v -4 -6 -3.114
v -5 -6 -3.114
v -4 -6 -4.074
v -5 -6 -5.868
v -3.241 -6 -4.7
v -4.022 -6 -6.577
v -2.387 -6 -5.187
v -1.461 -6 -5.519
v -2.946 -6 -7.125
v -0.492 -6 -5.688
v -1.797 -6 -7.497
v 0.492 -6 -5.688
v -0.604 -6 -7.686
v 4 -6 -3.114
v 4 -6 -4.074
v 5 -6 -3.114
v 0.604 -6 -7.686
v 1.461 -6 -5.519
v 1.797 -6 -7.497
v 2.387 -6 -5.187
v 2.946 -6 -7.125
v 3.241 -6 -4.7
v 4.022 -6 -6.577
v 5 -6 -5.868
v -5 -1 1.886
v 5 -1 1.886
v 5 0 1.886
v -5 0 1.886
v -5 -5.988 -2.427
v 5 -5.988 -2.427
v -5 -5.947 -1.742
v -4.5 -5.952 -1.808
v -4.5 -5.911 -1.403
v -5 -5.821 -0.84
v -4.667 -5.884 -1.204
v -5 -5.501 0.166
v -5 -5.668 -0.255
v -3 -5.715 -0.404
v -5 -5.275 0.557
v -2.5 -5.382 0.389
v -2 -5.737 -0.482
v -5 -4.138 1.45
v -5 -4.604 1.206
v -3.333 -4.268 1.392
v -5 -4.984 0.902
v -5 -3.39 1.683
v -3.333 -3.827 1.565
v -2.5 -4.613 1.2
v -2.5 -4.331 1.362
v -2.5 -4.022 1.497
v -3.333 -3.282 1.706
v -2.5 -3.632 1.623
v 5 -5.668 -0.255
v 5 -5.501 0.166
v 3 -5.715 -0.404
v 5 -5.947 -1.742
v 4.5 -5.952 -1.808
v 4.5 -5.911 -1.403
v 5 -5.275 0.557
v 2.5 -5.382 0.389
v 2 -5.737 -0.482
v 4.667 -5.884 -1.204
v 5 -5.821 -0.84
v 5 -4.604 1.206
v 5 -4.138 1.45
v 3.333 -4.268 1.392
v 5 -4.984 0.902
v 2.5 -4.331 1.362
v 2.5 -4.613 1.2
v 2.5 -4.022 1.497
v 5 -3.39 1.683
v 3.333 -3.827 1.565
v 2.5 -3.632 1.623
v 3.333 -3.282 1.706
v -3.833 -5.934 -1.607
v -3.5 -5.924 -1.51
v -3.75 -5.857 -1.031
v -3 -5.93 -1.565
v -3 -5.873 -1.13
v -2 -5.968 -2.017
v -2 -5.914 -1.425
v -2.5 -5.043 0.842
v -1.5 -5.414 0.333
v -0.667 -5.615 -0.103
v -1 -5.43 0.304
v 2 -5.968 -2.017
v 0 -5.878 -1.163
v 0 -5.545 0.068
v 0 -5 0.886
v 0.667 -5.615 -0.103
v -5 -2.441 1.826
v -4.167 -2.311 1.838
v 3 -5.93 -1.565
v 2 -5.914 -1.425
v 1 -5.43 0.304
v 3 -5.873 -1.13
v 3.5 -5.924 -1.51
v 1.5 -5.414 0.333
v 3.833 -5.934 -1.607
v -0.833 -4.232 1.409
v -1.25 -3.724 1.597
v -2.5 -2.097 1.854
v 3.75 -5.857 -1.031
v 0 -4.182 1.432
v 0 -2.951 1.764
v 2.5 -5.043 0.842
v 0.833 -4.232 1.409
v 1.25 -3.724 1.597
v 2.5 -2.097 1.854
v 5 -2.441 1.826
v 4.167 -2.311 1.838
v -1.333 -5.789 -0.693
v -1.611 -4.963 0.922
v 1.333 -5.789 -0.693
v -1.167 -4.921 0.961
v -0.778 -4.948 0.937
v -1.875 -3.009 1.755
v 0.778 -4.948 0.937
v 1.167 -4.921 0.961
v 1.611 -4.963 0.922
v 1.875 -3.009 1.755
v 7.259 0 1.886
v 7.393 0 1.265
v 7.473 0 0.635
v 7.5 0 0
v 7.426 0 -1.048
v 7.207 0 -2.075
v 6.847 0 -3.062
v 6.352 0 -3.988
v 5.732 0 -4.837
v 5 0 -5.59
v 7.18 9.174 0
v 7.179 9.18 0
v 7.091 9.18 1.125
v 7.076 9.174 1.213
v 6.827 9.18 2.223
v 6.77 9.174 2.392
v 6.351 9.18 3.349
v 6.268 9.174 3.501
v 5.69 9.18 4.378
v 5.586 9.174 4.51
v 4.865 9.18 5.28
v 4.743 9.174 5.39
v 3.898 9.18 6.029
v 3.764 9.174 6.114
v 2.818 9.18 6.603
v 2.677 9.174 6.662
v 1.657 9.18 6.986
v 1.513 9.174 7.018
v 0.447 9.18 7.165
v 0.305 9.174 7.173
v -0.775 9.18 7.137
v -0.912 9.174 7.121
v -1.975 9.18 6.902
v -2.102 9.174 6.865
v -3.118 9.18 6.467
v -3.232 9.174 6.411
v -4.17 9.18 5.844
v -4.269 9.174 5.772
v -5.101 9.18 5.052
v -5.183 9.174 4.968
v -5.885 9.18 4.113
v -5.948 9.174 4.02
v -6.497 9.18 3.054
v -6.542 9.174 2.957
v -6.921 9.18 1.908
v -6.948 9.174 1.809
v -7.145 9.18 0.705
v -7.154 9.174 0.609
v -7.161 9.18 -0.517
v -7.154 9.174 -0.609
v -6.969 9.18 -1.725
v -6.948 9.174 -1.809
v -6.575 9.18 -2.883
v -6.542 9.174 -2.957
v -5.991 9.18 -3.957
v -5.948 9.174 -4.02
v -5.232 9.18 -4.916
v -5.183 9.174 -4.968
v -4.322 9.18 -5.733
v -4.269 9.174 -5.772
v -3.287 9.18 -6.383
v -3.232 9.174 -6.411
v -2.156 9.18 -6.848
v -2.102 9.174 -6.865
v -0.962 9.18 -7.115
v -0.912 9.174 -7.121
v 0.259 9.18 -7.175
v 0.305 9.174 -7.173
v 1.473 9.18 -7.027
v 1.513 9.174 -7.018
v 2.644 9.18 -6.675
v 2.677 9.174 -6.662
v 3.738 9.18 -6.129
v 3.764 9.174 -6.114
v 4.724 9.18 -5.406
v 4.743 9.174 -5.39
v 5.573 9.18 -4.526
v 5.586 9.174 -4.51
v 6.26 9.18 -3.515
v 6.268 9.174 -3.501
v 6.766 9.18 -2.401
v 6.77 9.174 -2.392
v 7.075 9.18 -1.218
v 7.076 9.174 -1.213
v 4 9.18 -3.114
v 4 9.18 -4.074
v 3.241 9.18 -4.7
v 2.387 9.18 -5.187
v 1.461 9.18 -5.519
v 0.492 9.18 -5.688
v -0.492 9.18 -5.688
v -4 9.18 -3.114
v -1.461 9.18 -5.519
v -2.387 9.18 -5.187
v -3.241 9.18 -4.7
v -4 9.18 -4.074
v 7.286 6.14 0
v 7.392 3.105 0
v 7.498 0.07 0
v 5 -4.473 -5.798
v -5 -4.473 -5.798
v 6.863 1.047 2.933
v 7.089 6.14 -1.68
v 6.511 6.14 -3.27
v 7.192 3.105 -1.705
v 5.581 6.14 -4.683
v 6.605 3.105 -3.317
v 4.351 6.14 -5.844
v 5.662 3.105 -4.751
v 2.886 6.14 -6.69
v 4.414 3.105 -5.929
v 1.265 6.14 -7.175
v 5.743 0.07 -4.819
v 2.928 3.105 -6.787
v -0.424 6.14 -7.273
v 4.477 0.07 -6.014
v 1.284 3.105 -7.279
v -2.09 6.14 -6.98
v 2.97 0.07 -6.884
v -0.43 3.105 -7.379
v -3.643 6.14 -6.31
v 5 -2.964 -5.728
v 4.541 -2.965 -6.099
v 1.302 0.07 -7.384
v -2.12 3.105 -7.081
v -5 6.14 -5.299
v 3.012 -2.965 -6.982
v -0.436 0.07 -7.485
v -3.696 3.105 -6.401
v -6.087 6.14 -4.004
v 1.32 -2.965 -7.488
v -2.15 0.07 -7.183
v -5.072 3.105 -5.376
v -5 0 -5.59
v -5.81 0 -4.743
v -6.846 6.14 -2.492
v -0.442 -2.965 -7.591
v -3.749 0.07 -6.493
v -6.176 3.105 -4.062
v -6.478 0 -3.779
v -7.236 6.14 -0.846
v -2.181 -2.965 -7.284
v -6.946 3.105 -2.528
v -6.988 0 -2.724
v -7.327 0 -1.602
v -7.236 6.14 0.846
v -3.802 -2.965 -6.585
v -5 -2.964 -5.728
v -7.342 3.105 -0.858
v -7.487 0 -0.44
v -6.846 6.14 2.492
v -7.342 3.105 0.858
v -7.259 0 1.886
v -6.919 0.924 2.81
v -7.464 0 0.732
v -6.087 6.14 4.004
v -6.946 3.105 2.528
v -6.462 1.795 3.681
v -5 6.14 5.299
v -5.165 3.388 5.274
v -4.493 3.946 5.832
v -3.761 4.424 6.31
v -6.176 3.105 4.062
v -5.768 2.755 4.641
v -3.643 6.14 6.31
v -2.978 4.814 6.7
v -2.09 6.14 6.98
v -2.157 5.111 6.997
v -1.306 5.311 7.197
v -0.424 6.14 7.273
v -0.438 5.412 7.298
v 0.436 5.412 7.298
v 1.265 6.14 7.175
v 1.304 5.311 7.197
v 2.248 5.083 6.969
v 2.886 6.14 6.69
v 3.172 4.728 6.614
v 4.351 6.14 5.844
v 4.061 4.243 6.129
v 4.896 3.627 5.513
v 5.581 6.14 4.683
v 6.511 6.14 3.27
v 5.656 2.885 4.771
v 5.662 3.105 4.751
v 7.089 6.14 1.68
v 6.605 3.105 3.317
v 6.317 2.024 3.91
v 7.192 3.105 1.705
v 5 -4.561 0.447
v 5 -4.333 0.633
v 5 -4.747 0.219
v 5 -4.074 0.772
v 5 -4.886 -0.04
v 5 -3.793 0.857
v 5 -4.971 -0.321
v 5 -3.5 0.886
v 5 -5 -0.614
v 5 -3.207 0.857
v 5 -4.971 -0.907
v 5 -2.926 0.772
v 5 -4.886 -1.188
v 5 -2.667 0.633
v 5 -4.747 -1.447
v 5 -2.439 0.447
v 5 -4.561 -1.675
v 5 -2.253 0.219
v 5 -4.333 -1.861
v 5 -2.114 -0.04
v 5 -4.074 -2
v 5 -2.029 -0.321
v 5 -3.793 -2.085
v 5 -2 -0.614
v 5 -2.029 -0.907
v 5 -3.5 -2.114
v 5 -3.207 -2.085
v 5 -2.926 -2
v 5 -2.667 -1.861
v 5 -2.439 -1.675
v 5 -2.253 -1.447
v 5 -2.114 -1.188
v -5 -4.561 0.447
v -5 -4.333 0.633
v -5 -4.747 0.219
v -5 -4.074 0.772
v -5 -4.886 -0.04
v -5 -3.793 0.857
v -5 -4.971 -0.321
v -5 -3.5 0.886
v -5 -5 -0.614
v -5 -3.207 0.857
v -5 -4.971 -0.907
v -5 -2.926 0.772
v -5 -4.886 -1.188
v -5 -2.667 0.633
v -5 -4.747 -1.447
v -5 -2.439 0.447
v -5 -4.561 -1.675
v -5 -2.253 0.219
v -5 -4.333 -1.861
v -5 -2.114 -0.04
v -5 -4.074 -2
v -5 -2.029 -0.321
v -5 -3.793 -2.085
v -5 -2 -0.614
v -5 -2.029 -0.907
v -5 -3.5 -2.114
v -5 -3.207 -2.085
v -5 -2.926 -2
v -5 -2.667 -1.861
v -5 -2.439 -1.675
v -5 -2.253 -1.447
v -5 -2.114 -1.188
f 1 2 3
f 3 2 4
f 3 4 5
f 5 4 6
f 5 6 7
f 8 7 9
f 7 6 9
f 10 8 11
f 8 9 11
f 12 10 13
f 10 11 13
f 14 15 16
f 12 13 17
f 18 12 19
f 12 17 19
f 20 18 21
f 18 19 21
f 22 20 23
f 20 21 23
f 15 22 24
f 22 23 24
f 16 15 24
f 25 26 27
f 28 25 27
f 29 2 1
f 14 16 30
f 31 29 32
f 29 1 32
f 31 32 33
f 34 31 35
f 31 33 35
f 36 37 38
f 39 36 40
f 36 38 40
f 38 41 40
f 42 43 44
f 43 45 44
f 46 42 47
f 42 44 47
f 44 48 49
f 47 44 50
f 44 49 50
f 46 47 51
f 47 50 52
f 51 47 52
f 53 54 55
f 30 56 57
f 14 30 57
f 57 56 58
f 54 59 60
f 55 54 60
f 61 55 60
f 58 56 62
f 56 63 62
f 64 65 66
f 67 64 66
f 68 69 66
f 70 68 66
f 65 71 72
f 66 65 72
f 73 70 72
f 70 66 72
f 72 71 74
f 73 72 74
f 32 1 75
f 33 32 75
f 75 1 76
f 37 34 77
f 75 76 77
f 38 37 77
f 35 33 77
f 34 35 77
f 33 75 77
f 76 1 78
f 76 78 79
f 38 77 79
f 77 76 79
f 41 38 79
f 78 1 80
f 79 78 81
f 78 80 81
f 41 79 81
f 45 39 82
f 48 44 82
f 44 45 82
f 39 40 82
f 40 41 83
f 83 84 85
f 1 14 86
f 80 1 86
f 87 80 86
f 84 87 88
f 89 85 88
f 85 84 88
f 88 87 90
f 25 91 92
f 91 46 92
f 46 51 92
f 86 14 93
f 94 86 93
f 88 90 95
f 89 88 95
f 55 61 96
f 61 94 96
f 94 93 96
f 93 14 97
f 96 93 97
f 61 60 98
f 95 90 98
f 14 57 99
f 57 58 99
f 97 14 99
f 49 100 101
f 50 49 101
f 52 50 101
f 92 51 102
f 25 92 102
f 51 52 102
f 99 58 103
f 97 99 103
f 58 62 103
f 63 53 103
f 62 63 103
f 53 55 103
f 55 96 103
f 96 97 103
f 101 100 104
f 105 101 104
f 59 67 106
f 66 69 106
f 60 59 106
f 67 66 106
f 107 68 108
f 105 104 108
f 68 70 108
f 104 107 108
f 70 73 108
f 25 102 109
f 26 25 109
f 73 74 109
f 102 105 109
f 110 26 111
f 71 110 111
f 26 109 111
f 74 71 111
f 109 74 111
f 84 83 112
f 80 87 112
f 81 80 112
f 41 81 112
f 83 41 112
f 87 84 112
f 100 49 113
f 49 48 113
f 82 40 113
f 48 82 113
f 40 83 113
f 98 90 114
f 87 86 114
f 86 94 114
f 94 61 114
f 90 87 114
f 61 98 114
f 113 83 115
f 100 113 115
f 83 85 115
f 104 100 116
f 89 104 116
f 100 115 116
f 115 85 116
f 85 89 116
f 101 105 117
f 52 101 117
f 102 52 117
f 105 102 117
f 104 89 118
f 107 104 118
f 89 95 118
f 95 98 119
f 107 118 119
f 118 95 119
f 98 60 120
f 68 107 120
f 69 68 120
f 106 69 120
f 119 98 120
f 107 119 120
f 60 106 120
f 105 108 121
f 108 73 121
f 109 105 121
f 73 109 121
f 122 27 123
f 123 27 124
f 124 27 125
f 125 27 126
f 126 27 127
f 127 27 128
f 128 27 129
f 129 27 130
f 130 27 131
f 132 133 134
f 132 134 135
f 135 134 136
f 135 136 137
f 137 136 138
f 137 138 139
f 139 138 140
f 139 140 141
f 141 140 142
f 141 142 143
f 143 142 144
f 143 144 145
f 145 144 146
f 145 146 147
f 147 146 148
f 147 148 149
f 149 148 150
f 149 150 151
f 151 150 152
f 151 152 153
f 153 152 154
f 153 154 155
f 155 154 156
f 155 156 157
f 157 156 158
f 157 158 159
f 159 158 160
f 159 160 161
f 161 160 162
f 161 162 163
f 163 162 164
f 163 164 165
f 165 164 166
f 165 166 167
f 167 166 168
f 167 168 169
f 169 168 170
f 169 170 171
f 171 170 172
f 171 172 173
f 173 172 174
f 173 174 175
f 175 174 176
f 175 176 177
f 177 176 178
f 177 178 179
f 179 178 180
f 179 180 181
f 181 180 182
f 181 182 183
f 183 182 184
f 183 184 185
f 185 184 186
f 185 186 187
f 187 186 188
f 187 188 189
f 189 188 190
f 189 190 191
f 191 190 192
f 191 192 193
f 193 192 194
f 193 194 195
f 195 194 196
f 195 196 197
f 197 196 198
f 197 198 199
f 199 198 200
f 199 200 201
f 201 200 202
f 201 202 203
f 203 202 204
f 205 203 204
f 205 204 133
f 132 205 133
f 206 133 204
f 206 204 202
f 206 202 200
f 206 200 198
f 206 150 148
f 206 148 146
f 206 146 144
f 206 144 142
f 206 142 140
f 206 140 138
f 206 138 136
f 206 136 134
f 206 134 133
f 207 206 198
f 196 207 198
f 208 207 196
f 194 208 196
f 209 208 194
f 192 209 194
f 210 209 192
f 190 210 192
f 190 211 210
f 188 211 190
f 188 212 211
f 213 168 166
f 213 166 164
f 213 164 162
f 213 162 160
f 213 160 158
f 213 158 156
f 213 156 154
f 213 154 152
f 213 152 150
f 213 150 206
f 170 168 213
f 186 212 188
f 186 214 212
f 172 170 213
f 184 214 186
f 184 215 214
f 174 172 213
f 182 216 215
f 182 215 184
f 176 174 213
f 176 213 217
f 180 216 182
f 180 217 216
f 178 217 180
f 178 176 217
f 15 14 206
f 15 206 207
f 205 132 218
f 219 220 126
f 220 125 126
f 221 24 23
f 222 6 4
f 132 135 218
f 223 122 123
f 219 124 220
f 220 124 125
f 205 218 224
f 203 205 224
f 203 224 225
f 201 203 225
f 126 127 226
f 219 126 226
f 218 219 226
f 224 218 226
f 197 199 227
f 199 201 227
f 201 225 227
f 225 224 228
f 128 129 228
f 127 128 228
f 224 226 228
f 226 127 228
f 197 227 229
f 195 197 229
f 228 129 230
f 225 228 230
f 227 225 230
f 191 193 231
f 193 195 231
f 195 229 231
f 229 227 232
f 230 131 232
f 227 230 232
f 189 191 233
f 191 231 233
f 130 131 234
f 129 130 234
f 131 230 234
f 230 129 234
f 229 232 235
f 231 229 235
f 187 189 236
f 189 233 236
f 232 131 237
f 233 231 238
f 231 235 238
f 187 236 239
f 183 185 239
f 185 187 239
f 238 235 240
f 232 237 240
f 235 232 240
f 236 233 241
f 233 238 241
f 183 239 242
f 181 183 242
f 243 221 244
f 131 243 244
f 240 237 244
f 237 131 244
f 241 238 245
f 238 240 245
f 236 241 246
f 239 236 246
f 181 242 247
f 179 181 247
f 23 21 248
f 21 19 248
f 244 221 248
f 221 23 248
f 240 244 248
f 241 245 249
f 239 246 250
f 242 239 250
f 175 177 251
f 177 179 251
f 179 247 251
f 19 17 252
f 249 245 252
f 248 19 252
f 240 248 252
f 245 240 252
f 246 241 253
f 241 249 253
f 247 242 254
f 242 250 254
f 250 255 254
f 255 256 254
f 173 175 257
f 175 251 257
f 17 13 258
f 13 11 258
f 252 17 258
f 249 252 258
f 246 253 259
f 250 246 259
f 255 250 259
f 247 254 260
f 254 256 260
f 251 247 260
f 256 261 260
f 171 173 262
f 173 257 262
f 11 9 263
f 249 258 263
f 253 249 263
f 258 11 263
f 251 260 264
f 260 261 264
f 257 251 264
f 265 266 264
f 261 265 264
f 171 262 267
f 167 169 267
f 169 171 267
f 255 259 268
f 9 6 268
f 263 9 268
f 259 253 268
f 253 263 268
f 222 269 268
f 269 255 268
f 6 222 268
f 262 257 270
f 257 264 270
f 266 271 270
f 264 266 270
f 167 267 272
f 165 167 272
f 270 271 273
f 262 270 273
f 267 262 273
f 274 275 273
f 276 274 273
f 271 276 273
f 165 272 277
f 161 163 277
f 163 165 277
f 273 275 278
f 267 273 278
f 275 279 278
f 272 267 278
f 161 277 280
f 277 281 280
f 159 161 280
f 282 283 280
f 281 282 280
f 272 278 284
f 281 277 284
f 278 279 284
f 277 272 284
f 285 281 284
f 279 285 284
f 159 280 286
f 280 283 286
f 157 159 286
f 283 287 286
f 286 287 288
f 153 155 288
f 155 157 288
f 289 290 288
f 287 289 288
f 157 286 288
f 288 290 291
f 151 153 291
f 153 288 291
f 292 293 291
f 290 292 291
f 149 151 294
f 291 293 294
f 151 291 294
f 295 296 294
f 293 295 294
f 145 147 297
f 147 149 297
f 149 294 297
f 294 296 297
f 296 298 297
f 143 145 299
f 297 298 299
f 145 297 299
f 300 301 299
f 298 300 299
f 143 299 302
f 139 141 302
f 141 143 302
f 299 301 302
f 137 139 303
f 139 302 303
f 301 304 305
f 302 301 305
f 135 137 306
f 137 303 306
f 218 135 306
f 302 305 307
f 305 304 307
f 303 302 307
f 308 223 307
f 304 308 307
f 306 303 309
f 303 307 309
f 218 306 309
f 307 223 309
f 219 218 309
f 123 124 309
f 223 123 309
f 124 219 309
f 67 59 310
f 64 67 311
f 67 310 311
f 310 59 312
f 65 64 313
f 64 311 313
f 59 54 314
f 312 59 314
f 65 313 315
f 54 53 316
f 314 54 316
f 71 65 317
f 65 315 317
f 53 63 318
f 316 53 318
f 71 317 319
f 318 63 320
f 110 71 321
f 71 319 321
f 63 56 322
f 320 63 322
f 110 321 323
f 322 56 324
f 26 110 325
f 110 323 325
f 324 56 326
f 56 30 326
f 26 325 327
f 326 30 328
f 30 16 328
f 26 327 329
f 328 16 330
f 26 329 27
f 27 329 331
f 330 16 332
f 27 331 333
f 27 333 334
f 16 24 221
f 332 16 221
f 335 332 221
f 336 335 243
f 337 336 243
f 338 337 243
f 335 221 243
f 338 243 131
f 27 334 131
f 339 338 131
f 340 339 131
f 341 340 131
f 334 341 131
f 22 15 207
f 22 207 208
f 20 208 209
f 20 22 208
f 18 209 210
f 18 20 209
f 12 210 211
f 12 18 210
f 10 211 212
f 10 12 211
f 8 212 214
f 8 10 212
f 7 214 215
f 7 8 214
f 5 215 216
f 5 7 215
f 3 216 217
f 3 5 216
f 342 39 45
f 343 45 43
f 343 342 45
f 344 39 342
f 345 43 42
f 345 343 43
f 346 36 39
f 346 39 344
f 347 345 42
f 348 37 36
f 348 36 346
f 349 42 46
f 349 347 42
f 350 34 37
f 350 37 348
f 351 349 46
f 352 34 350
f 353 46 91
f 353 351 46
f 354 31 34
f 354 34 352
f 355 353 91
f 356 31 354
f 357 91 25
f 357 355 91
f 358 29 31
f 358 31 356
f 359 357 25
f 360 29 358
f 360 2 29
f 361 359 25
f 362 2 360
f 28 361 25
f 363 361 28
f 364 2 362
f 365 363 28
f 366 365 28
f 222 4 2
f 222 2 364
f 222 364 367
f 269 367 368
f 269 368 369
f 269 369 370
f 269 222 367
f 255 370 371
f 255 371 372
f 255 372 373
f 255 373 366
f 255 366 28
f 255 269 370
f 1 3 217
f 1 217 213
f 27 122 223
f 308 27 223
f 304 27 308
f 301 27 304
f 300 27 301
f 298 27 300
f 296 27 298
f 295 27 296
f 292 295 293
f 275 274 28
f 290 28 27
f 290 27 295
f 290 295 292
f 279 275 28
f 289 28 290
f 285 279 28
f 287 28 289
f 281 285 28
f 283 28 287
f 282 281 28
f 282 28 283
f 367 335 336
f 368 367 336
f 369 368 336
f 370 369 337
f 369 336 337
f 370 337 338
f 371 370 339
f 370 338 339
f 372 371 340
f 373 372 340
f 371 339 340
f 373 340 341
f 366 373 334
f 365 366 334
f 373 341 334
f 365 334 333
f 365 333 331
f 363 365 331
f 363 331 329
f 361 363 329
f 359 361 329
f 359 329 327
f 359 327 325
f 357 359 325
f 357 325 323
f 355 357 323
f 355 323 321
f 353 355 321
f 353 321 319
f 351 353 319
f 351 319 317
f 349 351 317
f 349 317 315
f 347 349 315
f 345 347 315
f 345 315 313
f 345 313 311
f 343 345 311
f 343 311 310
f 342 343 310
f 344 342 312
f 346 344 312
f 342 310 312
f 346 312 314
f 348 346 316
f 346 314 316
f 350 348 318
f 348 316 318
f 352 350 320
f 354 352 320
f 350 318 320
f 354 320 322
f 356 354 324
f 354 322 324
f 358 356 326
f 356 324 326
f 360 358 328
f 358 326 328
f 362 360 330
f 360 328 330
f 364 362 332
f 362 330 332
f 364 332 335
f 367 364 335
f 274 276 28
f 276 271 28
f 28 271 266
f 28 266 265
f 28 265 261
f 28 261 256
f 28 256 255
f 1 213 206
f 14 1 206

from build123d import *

# Parameters (mm, degrees)
SKETCH1_R                     = 7.5
BOSS_EXTRUDE1_DEPTH           = 19
BOSS_EXTRUDE1_TAPER           = 2
BOSS_EXTRUDE1_OTHER_WAY_DEPTH = 6
BOSS_EXTRUDE1_OTHER_WAY_TAPER = -2
CUT_EXTRUDE1_DEPTH            = 22.90601606
CUT_EXTRUDE1_DEPTH_BACK       = 22.90601606
CUT_EXTRUDE2_START            = -9.595582485
CUT_EXTRUDE2_OUTLINE_W        = 6.502745185
CUT_EXTRUDE2_OUTLINE_H        = 6
CUT_EXTRUDE2_DEPTH            = 9.595582485
SKETCH5_R                     = 1.5
CUT_EXTRUDE3_DEPTH            = 25.014303442
FILLET1_SIZE                  = 5
CUT_EXTRUDE4_DEPTH            = 22.833157665
CUT_EXTRUDE4_DEPTH_BACK       = 22.833157665
SKETCH6_W                     = 18.67842866
SKETCH6_H                     = 10.820279471
CUT_EXTRUDE5_DEPTH            = 19.604050317


with BuildPart() as part:
    # Sketch1 → Boss-Extrude1 (new body)
    with BuildSketch(Plane(origin=(0, 0, 0), x_dir=(1, 0, 0), z_dir=(0, 1, 0))):
        Circle(SKETCH1_R)
    extrude(amount=BOSS_EXTRUDE1_DEPTH, taper=BOSS_EXTRUDE1_TAPER)

    # Sketch1 → Boss-Extrude1 other way (add)
    with BuildSketch(Plane(origin=(0, 0, 0), x_dir=(1, 0, 0), z_dir=(0, 1, 0))):
        Circle(SKETCH1_R)
    extrude(amount=-BOSS_EXTRUDE1_OTHER_WAY_DEPTH, taper=BOSS_EXTRUDE1_OTHER_WAY_TAPER)

    # Sketch3 → Cut-Extrude1 (cut, two sides: drawn at the far end of the back side and taken through both)
    with BuildSketch(Plane(origin=(0, 0, 0), x_dir=(0, 0, -1), z_dir=(1, 0, 0)).offset(-CUT_EXTRUDE1_DEPTH_BACK)):
        Polygon((-1.886057768, -6), (-1.886057768, 0), (-9.929766736, 8.043708969), (-9.929766736, -6), align=None)
    extrude(amount=CUT_EXTRUDE1_DEPTH + CUT_EXTRUDE1_DEPTH_BACK, mode=Mode.SUBTRACT)

    # Cut-Extrude2: read off the stored shape, not the designer's step
    # Cut-Extrude2 outline → Cut-Extrude2 (cut)
    with BuildSketch(Plane.XY.offset(1.886057768).offset(CUT_EXTRUDE2_START)):
        with Locations((-8.251372593, -3)):
            Rectangle(CUT_EXTRUDE2_OUTLINE_W, CUT_EXTRUDE2_OUTLINE_H)
        with Locations((8.251372593, -3)):
            Rectangle(CUT_EXTRUDE2_OUTLINE_W, CUT_EXTRUDE2_OUTLINE_H)
    extrude(amount=CUT_EXTRUDE2_DEPTH, mode=Mode.SUBTRACT)

    # Sketch5 → Cut-Extrude3 (cut, through all)
    with BuildSketch(Plane(origin=(5, 0, 0), x_dir=(0, 0, -1), z_dir=(1, 0, 0))):
        with Locations((0.613942232, -3.5)):
            Circle(SKETCH5_R)
    extrude(amount=-CUT_EXTRUDE3_DEPTH, mode=Mode.SUBTRACT)

    # Fillet1
    # a fillet whose section is not a circle: 5 mm, written as the material it takes off along each edge
    with BuildSketch(Plane(origin=(17.5, -6, 1.886057768), x_dir=(0, 0, -1), z_dir=(-1, 0, 0))) as fillet1_piece_1:
        with BuildLine():
            Bezier((FILLET1_SIZE, 0), (0, 0), (0, -FILLET1_SIZE), weights=[1, 1.5, 1])
            Line((0, -FILLET1_SIZE), (0, 0))
            Line((0, 0), (FILLET1_SIZE, 0))
        make_face()
    extrude(amount=35, mode=Mode.SUBTRACT)

    # Fillet2
    # a fillet whose section is not a circle: 10, 5 mm, written as the material it takes off along each edge
    with BuildSketch(Plane(origin=(0, 19, 0), x_dir=(1, 0, 0), z_dir=(0, 0, -1))) as fillet2_piece_1:
        with BuildLine():
            Bezier((7.179619488, 9.825502516), (6.83650538, 0), (2.182665353, 0), weights=[1, 0.818181818, 1])
            Line((2.182665353, 0), (6.83650538, 0))
            Line((6.83650538, 0), (7.179619488, 9.825502516))
        make_face()
    revolve(axis=Axis((0, 19, 0), (0, -1, 0)), mode=Mode.SUBTRACT)

    # Sketch6 → Cut-Extrude4 (cut, two sides: drawn at the far end of the back side and taken through both)
    with BuildSketch(Plane(origin=(0, 0, 0), x_dir=(0, 0, -1), z_dir=(1, 0, 0)).offset(-CUT_EXTRUDE4_DEPTH_BACK)):
        with Locations((-1.153671222, 14.589860265)):
            Rectangle(SKETCH6_W, SKETCH6_H)
    extrude(amount=CUT_EXTRUDE4_DEPTH + CUT_EXTRUDE4_DEPTH_BACK, mode=Mode.SUBTRACT)

    # Sketch7 → Cut-Extrude5 (cut, through all)
    with BuildSketch(Plane.XZ.offset(6)):
        with BuildLine():
            Line((4, -3.113942232), (4, -4.074146702))
            ThreePointArc((4, -4.074146702), (0, -5.709524617), (-4, -4.074146702))
            Line((-4, -4.074146702), (-4, -3.113942232))
            Line((-4, -3.113942232), (4, -3.113942232))
        make_face()
    extrude(amount=-CUT_EXTRUDE5_DEPTH, mode=Mode.SUBTRACT)


solid = part.part
